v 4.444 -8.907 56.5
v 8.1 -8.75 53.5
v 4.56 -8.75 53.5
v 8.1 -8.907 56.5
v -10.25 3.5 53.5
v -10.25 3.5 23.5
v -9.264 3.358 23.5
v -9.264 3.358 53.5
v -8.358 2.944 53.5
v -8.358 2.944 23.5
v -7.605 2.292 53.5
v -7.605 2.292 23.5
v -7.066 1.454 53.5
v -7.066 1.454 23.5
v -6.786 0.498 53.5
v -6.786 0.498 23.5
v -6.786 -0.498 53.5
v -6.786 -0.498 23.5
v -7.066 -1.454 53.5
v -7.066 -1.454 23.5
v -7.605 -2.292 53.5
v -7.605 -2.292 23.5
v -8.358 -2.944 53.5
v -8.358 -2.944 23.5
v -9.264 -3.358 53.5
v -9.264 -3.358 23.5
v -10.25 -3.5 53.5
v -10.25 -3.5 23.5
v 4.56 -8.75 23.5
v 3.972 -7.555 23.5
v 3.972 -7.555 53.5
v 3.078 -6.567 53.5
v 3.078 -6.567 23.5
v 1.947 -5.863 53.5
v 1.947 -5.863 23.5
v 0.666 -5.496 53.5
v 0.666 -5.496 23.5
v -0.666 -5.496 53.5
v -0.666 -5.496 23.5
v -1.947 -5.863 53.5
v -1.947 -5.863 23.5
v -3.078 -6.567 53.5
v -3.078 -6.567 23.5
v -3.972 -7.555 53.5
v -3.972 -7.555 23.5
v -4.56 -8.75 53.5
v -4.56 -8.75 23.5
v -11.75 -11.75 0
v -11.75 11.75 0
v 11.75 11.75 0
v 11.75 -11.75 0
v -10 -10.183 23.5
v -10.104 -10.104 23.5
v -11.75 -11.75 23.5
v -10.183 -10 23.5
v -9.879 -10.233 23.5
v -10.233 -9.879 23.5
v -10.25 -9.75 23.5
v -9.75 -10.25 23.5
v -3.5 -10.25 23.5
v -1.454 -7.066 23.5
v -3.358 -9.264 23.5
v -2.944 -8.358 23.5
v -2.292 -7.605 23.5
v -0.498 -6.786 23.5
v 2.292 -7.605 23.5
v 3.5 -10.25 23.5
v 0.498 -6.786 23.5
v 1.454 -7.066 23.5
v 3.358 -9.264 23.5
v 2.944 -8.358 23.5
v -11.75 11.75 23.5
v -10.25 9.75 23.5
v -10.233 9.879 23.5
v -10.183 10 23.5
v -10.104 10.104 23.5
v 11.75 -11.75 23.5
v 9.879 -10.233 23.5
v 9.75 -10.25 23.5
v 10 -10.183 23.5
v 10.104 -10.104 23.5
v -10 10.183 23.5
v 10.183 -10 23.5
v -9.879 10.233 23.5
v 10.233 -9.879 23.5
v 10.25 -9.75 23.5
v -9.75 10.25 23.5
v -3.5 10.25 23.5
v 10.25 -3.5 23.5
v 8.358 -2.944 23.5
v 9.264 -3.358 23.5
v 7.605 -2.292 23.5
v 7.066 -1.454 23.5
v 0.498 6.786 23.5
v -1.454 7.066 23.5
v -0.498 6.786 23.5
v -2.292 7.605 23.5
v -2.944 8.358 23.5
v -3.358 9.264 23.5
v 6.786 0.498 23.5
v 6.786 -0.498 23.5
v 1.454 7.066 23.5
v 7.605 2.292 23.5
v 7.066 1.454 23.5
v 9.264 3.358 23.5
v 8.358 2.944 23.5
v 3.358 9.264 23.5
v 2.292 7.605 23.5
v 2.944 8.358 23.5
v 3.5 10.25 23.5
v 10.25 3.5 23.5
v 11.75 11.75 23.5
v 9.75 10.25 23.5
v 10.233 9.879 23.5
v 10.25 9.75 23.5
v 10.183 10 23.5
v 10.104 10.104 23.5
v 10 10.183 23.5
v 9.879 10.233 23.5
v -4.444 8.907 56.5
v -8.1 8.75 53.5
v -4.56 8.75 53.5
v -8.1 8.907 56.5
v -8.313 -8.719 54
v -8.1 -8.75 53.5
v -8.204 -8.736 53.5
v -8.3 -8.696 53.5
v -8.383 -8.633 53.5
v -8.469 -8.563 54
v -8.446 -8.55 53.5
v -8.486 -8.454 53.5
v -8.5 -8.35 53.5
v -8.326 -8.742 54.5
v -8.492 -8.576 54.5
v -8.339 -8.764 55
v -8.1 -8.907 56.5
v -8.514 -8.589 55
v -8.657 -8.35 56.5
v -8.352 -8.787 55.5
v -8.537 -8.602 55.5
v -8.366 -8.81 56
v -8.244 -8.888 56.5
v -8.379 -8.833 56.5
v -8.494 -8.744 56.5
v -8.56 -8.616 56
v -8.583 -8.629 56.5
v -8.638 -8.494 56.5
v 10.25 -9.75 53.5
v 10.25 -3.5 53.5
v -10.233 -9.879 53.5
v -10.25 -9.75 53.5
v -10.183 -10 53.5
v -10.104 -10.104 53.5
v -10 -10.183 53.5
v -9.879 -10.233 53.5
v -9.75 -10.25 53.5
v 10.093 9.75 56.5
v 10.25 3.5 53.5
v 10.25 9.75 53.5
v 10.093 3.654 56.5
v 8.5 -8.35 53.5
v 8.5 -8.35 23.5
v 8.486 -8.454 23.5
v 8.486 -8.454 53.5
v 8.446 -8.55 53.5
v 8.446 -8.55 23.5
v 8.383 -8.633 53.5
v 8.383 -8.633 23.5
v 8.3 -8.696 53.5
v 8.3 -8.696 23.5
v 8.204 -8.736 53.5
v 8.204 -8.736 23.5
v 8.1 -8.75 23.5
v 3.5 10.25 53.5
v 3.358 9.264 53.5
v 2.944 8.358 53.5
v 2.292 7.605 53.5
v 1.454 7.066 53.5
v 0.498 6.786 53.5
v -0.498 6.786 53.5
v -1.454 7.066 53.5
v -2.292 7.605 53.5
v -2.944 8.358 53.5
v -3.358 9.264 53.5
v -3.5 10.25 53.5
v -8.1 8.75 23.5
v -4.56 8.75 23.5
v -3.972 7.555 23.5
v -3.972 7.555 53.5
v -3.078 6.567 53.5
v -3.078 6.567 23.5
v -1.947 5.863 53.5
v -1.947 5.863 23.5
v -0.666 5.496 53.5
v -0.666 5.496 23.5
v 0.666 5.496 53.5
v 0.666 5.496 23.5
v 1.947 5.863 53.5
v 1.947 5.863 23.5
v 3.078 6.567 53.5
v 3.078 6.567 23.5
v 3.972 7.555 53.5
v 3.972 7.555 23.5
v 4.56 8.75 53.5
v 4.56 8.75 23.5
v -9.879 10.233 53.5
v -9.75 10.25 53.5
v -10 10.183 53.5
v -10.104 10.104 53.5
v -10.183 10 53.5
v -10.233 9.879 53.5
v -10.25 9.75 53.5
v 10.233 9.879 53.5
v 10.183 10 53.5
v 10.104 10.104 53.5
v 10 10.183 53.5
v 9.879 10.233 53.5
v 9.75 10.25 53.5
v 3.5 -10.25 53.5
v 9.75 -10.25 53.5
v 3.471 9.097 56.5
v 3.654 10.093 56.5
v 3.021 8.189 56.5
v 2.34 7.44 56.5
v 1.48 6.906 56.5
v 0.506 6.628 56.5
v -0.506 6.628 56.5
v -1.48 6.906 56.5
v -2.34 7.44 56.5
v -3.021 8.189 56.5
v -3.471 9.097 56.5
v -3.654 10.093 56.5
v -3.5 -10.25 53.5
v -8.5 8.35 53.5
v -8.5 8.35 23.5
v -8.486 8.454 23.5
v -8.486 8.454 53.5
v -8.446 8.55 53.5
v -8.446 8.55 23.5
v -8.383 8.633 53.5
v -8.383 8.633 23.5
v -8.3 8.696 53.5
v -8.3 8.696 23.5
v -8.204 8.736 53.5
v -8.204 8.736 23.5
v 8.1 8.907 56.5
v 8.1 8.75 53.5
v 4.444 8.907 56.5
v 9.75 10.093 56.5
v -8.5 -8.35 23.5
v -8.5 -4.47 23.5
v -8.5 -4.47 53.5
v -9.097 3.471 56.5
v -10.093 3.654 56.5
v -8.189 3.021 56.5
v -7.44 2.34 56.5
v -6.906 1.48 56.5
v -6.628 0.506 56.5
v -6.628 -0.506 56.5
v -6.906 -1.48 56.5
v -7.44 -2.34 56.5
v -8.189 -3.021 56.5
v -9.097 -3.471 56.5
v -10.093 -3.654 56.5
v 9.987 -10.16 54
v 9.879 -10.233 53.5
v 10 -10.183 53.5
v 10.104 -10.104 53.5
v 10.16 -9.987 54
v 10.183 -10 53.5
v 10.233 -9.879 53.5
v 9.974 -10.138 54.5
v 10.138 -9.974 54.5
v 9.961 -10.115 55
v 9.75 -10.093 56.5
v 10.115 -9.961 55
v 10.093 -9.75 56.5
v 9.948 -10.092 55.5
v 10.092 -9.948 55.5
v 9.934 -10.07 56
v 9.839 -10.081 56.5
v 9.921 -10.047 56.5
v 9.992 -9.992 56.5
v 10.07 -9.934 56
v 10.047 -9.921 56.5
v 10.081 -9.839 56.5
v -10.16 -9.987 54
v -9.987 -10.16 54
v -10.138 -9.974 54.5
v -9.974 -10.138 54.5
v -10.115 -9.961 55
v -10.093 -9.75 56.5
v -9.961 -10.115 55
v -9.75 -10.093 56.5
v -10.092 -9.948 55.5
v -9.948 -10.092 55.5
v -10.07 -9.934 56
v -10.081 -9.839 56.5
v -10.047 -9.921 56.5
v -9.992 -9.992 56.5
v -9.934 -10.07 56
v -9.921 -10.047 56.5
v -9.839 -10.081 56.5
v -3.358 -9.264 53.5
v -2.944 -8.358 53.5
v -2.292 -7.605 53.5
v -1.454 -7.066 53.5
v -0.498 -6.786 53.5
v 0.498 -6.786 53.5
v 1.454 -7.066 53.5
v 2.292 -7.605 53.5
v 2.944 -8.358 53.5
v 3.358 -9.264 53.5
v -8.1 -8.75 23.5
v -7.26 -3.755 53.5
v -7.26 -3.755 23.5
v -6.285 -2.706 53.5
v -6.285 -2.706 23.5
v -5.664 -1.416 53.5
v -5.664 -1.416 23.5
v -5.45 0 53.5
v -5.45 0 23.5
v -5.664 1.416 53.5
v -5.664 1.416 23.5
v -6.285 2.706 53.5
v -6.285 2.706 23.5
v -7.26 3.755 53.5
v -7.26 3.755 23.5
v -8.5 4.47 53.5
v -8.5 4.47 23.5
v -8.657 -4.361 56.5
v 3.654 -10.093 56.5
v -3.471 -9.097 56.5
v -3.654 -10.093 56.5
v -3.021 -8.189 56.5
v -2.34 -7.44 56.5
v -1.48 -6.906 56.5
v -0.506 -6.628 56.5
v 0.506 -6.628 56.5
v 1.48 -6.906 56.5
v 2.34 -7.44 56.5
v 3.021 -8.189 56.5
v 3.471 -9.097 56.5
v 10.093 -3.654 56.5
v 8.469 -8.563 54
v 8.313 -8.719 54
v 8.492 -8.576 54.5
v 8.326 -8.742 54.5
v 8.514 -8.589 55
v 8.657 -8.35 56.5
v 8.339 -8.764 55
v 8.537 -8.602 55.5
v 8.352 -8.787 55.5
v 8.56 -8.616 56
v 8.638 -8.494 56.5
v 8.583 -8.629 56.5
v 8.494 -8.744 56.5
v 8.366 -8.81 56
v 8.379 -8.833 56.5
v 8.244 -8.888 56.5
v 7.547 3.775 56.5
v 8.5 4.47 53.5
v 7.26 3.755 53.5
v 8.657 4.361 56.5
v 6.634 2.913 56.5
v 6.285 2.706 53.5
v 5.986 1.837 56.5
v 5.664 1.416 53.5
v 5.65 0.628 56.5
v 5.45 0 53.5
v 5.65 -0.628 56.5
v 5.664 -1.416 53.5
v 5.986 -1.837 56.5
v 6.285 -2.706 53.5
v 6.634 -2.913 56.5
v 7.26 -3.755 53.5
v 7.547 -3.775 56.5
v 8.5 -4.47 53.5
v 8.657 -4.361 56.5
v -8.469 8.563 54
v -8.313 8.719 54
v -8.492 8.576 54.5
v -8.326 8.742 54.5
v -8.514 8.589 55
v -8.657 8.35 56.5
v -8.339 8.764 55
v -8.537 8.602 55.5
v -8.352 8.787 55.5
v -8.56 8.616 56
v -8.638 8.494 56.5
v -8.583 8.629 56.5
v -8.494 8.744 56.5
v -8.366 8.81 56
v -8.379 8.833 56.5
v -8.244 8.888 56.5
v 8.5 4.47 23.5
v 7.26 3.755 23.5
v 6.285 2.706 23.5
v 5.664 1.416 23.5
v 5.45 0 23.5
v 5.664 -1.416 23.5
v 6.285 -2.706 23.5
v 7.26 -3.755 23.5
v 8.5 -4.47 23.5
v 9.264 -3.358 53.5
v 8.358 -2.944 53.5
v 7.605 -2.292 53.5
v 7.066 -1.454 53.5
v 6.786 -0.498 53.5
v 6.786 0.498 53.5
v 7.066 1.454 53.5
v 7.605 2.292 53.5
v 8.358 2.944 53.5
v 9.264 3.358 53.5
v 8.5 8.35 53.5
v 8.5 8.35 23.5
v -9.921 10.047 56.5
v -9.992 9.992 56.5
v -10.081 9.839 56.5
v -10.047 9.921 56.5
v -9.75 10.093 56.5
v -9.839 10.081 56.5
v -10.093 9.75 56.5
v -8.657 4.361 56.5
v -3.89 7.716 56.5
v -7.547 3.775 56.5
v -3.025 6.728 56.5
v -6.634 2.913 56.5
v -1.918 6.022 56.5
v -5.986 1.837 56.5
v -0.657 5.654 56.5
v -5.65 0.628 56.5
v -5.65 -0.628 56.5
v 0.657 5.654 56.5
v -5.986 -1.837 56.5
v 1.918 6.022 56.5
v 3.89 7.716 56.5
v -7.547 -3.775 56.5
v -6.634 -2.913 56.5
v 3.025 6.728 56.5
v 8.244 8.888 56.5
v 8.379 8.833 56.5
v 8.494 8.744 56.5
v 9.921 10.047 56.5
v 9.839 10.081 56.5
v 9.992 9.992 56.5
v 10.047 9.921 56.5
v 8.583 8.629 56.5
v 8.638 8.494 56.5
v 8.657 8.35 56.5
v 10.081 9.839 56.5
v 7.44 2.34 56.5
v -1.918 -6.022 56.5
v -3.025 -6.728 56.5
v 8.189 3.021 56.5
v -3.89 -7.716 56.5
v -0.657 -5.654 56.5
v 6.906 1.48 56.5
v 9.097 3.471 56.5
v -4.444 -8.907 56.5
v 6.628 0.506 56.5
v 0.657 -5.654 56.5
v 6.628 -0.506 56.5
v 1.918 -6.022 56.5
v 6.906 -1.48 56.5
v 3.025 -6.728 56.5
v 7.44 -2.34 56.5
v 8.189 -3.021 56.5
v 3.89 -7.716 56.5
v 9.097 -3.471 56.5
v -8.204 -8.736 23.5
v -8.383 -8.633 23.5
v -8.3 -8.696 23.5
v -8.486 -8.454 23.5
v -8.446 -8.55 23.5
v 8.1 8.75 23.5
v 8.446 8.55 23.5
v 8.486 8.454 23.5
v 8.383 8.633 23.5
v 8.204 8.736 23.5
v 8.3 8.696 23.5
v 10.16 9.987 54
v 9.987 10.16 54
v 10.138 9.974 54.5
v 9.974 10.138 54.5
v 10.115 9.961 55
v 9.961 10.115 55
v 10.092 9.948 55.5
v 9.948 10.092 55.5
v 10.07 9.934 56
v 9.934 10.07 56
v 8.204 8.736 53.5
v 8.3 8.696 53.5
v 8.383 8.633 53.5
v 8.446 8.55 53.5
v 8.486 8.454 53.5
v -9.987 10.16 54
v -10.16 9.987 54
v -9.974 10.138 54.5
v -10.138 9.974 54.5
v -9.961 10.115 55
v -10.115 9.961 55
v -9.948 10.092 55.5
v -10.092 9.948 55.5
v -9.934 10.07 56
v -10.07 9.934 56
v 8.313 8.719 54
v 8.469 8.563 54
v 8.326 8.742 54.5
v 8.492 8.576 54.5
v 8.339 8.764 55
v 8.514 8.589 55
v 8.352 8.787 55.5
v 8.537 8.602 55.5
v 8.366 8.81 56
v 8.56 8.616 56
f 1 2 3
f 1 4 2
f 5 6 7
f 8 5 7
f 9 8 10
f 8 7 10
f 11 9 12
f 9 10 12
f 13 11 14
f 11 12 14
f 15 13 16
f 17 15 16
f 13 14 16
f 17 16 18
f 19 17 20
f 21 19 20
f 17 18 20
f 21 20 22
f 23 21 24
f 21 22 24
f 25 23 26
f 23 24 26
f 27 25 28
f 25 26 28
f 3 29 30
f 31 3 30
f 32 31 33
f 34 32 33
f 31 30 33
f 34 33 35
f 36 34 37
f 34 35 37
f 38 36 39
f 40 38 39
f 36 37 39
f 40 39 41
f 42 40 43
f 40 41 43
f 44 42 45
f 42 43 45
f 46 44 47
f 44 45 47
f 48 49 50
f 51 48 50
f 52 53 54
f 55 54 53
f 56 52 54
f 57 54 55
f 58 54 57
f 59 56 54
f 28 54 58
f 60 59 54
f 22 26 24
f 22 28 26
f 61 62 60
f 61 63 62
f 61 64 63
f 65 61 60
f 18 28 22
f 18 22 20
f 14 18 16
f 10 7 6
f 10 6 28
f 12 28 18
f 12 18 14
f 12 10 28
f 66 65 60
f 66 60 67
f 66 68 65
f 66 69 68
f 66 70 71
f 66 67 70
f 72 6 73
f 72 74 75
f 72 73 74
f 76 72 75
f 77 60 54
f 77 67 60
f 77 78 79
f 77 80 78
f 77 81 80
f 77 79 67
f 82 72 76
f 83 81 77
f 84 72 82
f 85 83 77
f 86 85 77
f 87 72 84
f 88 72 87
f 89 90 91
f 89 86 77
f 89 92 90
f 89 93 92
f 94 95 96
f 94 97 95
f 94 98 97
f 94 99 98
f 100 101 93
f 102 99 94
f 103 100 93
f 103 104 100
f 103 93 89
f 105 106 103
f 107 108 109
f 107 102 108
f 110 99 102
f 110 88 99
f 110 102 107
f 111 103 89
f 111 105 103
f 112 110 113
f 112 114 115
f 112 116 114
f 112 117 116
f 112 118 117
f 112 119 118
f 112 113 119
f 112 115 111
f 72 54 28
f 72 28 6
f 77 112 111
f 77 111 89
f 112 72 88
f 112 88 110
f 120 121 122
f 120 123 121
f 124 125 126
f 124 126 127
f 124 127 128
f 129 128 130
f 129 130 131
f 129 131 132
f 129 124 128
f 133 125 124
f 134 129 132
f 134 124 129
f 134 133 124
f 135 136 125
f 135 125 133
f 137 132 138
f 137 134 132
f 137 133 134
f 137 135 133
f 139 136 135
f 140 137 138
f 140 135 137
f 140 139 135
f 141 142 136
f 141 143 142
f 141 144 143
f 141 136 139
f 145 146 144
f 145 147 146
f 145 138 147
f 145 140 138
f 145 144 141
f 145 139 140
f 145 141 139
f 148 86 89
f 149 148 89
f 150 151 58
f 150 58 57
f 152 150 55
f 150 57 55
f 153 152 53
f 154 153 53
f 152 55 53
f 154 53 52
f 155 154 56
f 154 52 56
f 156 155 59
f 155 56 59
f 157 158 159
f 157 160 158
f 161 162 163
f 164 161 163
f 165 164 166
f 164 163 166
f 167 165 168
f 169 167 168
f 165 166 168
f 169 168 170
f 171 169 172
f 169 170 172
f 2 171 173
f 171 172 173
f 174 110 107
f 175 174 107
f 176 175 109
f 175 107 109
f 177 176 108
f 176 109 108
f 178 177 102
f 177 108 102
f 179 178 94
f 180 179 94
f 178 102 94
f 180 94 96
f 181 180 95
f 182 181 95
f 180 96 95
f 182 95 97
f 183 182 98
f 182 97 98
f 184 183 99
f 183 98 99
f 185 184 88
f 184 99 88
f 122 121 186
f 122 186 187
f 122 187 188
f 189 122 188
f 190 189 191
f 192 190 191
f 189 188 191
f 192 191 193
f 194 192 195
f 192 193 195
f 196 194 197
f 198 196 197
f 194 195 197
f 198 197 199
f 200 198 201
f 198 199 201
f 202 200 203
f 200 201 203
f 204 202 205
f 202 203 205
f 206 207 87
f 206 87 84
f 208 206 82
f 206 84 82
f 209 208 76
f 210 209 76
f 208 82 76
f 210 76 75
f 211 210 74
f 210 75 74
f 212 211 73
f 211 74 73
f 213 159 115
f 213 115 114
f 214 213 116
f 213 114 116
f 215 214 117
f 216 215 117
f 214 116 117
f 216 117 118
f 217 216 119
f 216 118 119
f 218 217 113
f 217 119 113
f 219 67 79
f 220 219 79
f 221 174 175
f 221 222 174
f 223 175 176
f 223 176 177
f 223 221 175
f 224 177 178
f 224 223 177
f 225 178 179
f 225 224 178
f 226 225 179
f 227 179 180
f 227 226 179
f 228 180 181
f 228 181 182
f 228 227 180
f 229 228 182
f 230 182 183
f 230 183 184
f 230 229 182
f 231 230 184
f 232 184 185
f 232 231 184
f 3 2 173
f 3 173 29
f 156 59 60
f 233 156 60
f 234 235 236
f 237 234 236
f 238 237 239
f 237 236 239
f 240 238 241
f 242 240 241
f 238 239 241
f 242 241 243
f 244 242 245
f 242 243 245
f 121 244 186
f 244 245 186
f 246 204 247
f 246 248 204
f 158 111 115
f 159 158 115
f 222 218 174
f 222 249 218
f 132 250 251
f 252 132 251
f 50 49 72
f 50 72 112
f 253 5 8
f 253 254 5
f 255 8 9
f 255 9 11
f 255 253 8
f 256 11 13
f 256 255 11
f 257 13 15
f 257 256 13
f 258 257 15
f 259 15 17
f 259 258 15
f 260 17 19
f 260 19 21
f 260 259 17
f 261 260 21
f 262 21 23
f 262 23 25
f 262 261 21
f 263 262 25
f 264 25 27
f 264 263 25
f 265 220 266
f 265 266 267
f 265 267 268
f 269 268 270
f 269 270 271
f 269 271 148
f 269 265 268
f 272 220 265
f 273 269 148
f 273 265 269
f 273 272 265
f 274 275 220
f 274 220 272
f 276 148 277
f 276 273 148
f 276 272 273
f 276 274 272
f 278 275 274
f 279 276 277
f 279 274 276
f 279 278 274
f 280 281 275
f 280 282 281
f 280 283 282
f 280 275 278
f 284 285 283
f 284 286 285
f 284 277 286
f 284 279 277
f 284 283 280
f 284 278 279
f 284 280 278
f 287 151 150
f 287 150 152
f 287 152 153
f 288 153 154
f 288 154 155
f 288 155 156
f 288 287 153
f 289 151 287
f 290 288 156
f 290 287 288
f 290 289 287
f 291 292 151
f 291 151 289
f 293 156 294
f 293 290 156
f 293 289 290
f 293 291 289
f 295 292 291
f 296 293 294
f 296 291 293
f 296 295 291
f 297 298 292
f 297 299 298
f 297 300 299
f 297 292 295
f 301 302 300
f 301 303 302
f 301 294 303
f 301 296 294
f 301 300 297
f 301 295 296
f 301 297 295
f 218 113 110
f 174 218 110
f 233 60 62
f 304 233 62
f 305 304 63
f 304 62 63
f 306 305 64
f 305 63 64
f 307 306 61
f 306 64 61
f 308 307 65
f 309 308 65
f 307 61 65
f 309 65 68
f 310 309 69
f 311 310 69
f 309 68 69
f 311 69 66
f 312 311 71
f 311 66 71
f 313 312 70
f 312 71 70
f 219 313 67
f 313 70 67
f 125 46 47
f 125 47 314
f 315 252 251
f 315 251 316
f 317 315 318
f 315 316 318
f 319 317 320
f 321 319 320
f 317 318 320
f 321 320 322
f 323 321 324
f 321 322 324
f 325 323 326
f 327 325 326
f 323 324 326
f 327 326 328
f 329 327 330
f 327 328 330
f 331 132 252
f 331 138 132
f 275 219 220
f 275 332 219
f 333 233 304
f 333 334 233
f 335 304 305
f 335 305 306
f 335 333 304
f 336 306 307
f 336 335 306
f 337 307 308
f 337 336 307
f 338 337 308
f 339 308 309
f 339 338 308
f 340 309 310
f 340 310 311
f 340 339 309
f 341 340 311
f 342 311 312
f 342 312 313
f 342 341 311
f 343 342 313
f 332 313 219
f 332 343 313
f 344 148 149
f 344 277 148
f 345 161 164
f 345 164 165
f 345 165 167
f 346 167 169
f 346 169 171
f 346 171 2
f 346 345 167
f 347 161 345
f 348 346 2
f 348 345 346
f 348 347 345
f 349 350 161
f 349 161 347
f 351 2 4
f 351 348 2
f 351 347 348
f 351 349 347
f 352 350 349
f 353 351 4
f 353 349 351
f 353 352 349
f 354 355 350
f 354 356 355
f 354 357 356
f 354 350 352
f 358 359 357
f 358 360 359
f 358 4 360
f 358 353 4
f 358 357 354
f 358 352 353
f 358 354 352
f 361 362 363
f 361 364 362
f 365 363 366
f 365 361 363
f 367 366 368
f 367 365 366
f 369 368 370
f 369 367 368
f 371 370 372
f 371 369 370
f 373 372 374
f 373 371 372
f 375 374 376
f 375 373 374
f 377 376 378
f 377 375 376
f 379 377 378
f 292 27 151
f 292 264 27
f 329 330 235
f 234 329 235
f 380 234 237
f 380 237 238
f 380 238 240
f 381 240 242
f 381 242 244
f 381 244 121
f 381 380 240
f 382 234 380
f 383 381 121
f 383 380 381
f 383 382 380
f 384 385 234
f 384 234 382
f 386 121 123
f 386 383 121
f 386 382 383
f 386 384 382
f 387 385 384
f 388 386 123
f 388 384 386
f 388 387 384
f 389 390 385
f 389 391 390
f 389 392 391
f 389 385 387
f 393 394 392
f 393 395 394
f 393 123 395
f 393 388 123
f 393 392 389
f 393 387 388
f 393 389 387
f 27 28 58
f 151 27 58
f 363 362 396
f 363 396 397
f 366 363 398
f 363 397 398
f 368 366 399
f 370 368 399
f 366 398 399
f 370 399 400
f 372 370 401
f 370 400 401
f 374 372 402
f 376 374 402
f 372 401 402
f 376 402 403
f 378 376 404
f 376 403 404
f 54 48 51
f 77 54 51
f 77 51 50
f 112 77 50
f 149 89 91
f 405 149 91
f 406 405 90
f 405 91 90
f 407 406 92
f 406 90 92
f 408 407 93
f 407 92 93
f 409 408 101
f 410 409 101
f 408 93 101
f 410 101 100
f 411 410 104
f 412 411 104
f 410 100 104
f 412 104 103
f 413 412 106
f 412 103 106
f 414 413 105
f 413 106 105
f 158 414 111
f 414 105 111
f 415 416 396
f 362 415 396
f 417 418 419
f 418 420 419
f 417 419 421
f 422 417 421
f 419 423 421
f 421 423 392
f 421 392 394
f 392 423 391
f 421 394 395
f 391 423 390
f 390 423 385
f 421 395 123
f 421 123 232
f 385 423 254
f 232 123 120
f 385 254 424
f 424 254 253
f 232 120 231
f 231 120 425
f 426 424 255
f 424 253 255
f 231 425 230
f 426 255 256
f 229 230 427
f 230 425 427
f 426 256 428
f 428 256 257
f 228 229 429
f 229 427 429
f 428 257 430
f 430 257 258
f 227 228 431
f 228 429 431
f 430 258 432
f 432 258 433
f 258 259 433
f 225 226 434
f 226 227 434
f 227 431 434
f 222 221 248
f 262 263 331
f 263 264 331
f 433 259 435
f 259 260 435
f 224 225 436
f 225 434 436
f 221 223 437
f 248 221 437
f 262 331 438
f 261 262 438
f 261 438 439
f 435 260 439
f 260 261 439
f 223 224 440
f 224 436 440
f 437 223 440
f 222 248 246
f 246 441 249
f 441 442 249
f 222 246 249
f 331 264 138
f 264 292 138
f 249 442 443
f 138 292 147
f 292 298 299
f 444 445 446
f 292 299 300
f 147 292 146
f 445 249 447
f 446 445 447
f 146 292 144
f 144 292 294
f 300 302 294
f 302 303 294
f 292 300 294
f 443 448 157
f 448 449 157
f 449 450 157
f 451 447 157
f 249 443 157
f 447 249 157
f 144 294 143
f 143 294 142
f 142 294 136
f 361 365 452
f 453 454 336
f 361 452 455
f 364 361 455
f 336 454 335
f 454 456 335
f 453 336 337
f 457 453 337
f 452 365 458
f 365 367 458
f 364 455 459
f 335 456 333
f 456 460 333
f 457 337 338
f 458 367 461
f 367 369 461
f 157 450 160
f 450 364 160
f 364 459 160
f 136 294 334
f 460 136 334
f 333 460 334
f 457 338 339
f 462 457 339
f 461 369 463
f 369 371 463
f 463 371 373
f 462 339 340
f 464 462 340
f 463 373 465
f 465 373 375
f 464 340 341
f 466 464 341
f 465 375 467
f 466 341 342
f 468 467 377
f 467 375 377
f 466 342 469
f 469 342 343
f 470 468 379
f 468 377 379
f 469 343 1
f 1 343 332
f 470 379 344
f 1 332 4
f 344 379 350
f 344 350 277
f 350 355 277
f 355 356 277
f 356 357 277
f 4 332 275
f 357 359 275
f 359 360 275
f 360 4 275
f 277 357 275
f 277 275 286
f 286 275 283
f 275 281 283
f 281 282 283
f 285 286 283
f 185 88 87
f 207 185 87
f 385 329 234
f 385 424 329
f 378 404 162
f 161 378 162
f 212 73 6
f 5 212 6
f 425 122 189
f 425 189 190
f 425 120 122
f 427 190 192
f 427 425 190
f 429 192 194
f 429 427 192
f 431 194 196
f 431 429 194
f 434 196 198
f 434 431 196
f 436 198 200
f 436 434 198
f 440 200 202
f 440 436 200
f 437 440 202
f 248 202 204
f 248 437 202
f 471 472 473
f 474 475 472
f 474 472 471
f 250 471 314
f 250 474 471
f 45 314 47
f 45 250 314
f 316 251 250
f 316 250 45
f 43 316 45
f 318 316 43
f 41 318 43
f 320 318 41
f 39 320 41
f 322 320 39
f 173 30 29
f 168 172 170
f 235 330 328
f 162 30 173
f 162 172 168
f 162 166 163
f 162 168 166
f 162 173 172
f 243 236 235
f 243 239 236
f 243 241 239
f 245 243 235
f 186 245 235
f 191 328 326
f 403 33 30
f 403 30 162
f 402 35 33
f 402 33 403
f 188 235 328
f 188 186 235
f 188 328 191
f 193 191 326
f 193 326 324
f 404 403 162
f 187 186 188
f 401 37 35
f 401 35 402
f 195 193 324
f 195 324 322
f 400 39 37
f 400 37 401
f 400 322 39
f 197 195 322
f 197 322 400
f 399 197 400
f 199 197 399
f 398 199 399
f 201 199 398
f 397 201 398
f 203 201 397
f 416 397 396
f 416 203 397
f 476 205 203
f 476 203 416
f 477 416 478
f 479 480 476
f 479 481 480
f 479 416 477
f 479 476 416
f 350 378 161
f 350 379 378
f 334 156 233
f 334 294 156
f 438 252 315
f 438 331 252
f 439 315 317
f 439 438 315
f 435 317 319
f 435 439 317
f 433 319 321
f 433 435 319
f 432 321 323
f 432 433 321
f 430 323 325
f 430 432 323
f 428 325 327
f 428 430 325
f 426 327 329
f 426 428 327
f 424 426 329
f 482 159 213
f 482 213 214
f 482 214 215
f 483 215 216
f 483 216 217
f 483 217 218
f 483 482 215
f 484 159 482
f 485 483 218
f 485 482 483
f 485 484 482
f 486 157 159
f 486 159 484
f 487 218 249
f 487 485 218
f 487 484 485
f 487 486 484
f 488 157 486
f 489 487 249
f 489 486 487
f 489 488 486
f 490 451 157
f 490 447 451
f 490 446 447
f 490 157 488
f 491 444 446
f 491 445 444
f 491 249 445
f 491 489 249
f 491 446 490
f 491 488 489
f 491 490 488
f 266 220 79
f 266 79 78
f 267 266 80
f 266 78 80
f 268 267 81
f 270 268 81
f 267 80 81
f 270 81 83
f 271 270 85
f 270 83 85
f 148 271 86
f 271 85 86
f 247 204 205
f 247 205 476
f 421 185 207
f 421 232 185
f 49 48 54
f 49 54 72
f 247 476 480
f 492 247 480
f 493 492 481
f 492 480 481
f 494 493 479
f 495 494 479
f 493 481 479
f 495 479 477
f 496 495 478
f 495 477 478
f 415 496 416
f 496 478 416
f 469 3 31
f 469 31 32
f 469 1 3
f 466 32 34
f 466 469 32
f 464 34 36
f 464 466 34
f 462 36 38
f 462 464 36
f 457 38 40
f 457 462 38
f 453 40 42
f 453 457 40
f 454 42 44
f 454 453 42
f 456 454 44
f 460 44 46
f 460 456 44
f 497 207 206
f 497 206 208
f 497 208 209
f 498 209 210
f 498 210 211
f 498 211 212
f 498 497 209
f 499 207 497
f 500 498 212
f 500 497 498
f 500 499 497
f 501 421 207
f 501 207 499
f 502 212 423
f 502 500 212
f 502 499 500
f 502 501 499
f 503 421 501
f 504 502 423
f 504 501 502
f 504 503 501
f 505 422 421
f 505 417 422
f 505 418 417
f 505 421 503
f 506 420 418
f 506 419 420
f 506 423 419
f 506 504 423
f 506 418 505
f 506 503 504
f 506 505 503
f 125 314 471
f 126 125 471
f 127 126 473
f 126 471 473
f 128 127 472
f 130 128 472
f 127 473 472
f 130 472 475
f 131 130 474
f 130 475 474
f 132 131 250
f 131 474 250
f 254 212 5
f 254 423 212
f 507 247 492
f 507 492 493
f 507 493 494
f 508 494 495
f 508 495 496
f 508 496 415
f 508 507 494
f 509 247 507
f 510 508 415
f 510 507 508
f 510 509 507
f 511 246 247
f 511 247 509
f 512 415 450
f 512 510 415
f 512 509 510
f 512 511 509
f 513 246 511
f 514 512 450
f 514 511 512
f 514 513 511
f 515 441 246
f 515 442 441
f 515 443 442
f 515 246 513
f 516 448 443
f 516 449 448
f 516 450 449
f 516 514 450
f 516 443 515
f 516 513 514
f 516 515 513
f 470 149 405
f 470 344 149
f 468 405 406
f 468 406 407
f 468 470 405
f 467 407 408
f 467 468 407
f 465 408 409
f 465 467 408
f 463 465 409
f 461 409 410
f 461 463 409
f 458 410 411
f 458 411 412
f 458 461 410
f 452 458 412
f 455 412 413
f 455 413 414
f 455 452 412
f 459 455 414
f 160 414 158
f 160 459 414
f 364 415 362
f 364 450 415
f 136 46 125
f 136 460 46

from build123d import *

# Parameters (mm, degrees)
F0_W     = 23.5
F0_H     = 23.5
F1_DEPTH = 23.5
F3_DEPTH = 30
F4_DEPTH = 3
F4_TAPER = 3


with BuildPart() as f1:
    # F0 (on Top) → F1 (new body)
    with BuildSketch(Plane.XY):
        Rectangle(F0_W, F0_H)
    extrude(amount=F1_DEPTH)

    # F2 (on face) → F3 (join)
    with BuildSketch(Plane.XY.offset(23.5)):
        with BuildLine():
            ThreePointArc((3.5, 10.25), (0, 6.75), (-3.5, 10.25))
            Line((-3.5, 10.25), (-9.75, 10.25))
            ThreePointArc((-9.75, 10.25), (-10.1035533906, 10.1035533906), (-10.25, 9.75))
            Line((-10.25, 9.75), (-10.25, 3.5))
            ThreePointArc((-10.25, 3.5), (-6.75, 0), (-10.25, -3.5))
            Line((-10.25, -3.5), (-10.25, -9.75))
            ThreePointArc((-10.25, -9.75), (-10.1035533906, -10.1035533906), (-9.75, -10.25))
            Line((-9.75, -10.25), (-3.5, -10.25))
            ThreePointArc((-3.5, -10.25), (0, -6.75), (3.5, -10.25))
            Line((3.5, -10.25), (9.75, -10.25))
            ThreePointArc((9.75, -10.25), (10.1035533906, -10.1035533906), (10.25, -9.75))
            Line((10.25, -9.75), (10.25, -3.5))
            ThreePointArc((10.25, -3.5), (6.75, 0), (10.25, 3.5))
            Line((10.25, 3.5), (10.25, 9.75))
            ThreePointArc((10.25, 9.75), (10.1035533906, 10.1035533906), (9.75, 10.25))
            Line((9.75, 10.25), (3.5, 10.25))
        make_face()
        with BuildLine():
            Line((-8.5, -8.35), (-8.5, -4.4696196706))
            ThreePointArc((-8.5, -4.4696196706), (-5.45, 0), (-8.5, 4.4696196706))
            Line((-8.5, 4.4696196706), (-8.5, 8.35))
            ThreePointArc((-8.5, 8.35), (-8.3828427125, 8.6328427125), (-8.1, 8.75))
            Line((-8.1, 8.75), (-4.5596052461, 8.75))
            ThreePointArc((-4.5596052461, 8.75), (0, 5.45), (4.5596052461, 8.75))
            Line((4.5596052461, 8.75), (8.1, 8.75))
            ThreePointArc((8.1, 8.75), (8.3828427125, 8.6328427125), (8.5, 8.35))
            Line((8.5, 8.35), (8.5, 4.4696196706))
            ThreePointArc((8.5, 4.4696196706), (5.45, 0), (8.5, -4.4696196706))
            Line((8.5, -4.4696196706), (8.5, -8.35))
            ThreePointArc((8.5, -8.35), (8.3828427125, -8.6328427125), (8.1, -8.75))
            Line((8.1, -8.75), (4.5596052461, -8.75))
            ThreePointArc((4.5596052461, -8.75), (0, -5.45), (-4.5596052461, -8.75))
            Line((-4.5596052461, -8.75), (-8.1, -8.75))
            ThreePointArc((-8.1, -8.75), (-8.3828427125, -8.6328427125), (-8.5, -8.35))
        make_face(mode=Mode.SUBTRACT)
    extrude(amount=F3_DEPTH)

    # F3_face (on face) → F4 (join)
    with BuildSketch(Plane.XY.offset(53.5)):
        with BuildLine():
            ThreePointArc((3.5, 10.25), (0, 6.75), (-3.5, 10.25))
            Line((-3.5, 10.25), (-9.75, 10.25))
            ThreePointArc((-9.75, 10.25), (-10.1035533906, 10.1035533906), (-10.25, 9.75))
            Line((-10.25, 9.75), (-10.25, 3.5))
            ThreePointArc((-10.25, 3.5), (-6.75, 0), (-10.25, -3.5))
            Line((-10.25, -3.5), (-10.25, -9.75))
            ThreePointArc((-10.25, -9.75), (-10.1035533906, -10.1035533906), (-9.75, -10.25))
            Line((-9.75, -10.25), (-3.5, -10.25))
            ThreePointArc((-3.5, -10.25), (0, -6.75), (3.5, -10.25))
            Line((3.5, -10.25), (9.75, -10.25))
            ThreePointArc((9.75, -10.25), (10.1035533906, -10.1035533906), (10.25, -9.75))
            Line((10.25, -9.75), (10.25, -3.5))
            ThreePointArc((10.25, -3.5), (6.75, 0), (10.25, 3.5))
            Line((10.25, 3.5), (10.25, 9.75))
            ThreePointArc((10.25, 9.75), (10.1035533906, 10.1035533906), (9.75, 10.25))
            Line((9.75, 10.25), (3.5, 10.25))
        make_face()
        with BuildLine():
            Line((-4.5596052461, -8.75), (-8.1, -8.75))
            ThreePointArc((-8.1, -8.75), (-8.3828427125, -8.6328427125), (-8.5, -8.35))
            Line((-8.5, -8.35), (-8.5, -4.4696196706))
            ThreePointArc((-8.5, -4.4696196706), (-5.45, 0), (-8.5, 4.4696196706))
            Line((-8.5, 4.4696196706), (-8.5, 8.35))
            ThreePointArc((-8.5, 8.35), (-8.3828427125, 8.6328427125), (-8.1, 8.75))
            Line((-8.1, 8.75), (-4.5596052461, 8.75))
            ThreePointArc((-4.5596052461, 8.75), (0, 5.45), (4.5596052461, 8.75))
            Line((4.5596052461, 8.75), (8.1, 8.75))
            ThreePointArc((8.1, 8.75), (8.3828427125, 8.6328427125), (8.5, 8.35))
            Line((8.5, 8.35), (8.5, 4.4696196706))
            ThreePointArc((8.5, 4.4696196706), (5.45, 0), (8.5, -4.4696196706))
            Line((8.5, -4.4696196706), (8.5, -8.35))
            ThreePointArc((8.5, -8.35), (8.3828427125, -8.6328427125), (8.1, -8.75))
            Line((8.1, -8.75), (4.5596052461, -8.75))
            ThreePointArc((4.5596052461, -8.75), (0, -5.45), (-4.5596052461, -8.75))
        make_face(mode=Mode.SUBTRACT)
    extrude(amount=F4_DEPTH, taper=F4_TAPER)


solid = f1.part
